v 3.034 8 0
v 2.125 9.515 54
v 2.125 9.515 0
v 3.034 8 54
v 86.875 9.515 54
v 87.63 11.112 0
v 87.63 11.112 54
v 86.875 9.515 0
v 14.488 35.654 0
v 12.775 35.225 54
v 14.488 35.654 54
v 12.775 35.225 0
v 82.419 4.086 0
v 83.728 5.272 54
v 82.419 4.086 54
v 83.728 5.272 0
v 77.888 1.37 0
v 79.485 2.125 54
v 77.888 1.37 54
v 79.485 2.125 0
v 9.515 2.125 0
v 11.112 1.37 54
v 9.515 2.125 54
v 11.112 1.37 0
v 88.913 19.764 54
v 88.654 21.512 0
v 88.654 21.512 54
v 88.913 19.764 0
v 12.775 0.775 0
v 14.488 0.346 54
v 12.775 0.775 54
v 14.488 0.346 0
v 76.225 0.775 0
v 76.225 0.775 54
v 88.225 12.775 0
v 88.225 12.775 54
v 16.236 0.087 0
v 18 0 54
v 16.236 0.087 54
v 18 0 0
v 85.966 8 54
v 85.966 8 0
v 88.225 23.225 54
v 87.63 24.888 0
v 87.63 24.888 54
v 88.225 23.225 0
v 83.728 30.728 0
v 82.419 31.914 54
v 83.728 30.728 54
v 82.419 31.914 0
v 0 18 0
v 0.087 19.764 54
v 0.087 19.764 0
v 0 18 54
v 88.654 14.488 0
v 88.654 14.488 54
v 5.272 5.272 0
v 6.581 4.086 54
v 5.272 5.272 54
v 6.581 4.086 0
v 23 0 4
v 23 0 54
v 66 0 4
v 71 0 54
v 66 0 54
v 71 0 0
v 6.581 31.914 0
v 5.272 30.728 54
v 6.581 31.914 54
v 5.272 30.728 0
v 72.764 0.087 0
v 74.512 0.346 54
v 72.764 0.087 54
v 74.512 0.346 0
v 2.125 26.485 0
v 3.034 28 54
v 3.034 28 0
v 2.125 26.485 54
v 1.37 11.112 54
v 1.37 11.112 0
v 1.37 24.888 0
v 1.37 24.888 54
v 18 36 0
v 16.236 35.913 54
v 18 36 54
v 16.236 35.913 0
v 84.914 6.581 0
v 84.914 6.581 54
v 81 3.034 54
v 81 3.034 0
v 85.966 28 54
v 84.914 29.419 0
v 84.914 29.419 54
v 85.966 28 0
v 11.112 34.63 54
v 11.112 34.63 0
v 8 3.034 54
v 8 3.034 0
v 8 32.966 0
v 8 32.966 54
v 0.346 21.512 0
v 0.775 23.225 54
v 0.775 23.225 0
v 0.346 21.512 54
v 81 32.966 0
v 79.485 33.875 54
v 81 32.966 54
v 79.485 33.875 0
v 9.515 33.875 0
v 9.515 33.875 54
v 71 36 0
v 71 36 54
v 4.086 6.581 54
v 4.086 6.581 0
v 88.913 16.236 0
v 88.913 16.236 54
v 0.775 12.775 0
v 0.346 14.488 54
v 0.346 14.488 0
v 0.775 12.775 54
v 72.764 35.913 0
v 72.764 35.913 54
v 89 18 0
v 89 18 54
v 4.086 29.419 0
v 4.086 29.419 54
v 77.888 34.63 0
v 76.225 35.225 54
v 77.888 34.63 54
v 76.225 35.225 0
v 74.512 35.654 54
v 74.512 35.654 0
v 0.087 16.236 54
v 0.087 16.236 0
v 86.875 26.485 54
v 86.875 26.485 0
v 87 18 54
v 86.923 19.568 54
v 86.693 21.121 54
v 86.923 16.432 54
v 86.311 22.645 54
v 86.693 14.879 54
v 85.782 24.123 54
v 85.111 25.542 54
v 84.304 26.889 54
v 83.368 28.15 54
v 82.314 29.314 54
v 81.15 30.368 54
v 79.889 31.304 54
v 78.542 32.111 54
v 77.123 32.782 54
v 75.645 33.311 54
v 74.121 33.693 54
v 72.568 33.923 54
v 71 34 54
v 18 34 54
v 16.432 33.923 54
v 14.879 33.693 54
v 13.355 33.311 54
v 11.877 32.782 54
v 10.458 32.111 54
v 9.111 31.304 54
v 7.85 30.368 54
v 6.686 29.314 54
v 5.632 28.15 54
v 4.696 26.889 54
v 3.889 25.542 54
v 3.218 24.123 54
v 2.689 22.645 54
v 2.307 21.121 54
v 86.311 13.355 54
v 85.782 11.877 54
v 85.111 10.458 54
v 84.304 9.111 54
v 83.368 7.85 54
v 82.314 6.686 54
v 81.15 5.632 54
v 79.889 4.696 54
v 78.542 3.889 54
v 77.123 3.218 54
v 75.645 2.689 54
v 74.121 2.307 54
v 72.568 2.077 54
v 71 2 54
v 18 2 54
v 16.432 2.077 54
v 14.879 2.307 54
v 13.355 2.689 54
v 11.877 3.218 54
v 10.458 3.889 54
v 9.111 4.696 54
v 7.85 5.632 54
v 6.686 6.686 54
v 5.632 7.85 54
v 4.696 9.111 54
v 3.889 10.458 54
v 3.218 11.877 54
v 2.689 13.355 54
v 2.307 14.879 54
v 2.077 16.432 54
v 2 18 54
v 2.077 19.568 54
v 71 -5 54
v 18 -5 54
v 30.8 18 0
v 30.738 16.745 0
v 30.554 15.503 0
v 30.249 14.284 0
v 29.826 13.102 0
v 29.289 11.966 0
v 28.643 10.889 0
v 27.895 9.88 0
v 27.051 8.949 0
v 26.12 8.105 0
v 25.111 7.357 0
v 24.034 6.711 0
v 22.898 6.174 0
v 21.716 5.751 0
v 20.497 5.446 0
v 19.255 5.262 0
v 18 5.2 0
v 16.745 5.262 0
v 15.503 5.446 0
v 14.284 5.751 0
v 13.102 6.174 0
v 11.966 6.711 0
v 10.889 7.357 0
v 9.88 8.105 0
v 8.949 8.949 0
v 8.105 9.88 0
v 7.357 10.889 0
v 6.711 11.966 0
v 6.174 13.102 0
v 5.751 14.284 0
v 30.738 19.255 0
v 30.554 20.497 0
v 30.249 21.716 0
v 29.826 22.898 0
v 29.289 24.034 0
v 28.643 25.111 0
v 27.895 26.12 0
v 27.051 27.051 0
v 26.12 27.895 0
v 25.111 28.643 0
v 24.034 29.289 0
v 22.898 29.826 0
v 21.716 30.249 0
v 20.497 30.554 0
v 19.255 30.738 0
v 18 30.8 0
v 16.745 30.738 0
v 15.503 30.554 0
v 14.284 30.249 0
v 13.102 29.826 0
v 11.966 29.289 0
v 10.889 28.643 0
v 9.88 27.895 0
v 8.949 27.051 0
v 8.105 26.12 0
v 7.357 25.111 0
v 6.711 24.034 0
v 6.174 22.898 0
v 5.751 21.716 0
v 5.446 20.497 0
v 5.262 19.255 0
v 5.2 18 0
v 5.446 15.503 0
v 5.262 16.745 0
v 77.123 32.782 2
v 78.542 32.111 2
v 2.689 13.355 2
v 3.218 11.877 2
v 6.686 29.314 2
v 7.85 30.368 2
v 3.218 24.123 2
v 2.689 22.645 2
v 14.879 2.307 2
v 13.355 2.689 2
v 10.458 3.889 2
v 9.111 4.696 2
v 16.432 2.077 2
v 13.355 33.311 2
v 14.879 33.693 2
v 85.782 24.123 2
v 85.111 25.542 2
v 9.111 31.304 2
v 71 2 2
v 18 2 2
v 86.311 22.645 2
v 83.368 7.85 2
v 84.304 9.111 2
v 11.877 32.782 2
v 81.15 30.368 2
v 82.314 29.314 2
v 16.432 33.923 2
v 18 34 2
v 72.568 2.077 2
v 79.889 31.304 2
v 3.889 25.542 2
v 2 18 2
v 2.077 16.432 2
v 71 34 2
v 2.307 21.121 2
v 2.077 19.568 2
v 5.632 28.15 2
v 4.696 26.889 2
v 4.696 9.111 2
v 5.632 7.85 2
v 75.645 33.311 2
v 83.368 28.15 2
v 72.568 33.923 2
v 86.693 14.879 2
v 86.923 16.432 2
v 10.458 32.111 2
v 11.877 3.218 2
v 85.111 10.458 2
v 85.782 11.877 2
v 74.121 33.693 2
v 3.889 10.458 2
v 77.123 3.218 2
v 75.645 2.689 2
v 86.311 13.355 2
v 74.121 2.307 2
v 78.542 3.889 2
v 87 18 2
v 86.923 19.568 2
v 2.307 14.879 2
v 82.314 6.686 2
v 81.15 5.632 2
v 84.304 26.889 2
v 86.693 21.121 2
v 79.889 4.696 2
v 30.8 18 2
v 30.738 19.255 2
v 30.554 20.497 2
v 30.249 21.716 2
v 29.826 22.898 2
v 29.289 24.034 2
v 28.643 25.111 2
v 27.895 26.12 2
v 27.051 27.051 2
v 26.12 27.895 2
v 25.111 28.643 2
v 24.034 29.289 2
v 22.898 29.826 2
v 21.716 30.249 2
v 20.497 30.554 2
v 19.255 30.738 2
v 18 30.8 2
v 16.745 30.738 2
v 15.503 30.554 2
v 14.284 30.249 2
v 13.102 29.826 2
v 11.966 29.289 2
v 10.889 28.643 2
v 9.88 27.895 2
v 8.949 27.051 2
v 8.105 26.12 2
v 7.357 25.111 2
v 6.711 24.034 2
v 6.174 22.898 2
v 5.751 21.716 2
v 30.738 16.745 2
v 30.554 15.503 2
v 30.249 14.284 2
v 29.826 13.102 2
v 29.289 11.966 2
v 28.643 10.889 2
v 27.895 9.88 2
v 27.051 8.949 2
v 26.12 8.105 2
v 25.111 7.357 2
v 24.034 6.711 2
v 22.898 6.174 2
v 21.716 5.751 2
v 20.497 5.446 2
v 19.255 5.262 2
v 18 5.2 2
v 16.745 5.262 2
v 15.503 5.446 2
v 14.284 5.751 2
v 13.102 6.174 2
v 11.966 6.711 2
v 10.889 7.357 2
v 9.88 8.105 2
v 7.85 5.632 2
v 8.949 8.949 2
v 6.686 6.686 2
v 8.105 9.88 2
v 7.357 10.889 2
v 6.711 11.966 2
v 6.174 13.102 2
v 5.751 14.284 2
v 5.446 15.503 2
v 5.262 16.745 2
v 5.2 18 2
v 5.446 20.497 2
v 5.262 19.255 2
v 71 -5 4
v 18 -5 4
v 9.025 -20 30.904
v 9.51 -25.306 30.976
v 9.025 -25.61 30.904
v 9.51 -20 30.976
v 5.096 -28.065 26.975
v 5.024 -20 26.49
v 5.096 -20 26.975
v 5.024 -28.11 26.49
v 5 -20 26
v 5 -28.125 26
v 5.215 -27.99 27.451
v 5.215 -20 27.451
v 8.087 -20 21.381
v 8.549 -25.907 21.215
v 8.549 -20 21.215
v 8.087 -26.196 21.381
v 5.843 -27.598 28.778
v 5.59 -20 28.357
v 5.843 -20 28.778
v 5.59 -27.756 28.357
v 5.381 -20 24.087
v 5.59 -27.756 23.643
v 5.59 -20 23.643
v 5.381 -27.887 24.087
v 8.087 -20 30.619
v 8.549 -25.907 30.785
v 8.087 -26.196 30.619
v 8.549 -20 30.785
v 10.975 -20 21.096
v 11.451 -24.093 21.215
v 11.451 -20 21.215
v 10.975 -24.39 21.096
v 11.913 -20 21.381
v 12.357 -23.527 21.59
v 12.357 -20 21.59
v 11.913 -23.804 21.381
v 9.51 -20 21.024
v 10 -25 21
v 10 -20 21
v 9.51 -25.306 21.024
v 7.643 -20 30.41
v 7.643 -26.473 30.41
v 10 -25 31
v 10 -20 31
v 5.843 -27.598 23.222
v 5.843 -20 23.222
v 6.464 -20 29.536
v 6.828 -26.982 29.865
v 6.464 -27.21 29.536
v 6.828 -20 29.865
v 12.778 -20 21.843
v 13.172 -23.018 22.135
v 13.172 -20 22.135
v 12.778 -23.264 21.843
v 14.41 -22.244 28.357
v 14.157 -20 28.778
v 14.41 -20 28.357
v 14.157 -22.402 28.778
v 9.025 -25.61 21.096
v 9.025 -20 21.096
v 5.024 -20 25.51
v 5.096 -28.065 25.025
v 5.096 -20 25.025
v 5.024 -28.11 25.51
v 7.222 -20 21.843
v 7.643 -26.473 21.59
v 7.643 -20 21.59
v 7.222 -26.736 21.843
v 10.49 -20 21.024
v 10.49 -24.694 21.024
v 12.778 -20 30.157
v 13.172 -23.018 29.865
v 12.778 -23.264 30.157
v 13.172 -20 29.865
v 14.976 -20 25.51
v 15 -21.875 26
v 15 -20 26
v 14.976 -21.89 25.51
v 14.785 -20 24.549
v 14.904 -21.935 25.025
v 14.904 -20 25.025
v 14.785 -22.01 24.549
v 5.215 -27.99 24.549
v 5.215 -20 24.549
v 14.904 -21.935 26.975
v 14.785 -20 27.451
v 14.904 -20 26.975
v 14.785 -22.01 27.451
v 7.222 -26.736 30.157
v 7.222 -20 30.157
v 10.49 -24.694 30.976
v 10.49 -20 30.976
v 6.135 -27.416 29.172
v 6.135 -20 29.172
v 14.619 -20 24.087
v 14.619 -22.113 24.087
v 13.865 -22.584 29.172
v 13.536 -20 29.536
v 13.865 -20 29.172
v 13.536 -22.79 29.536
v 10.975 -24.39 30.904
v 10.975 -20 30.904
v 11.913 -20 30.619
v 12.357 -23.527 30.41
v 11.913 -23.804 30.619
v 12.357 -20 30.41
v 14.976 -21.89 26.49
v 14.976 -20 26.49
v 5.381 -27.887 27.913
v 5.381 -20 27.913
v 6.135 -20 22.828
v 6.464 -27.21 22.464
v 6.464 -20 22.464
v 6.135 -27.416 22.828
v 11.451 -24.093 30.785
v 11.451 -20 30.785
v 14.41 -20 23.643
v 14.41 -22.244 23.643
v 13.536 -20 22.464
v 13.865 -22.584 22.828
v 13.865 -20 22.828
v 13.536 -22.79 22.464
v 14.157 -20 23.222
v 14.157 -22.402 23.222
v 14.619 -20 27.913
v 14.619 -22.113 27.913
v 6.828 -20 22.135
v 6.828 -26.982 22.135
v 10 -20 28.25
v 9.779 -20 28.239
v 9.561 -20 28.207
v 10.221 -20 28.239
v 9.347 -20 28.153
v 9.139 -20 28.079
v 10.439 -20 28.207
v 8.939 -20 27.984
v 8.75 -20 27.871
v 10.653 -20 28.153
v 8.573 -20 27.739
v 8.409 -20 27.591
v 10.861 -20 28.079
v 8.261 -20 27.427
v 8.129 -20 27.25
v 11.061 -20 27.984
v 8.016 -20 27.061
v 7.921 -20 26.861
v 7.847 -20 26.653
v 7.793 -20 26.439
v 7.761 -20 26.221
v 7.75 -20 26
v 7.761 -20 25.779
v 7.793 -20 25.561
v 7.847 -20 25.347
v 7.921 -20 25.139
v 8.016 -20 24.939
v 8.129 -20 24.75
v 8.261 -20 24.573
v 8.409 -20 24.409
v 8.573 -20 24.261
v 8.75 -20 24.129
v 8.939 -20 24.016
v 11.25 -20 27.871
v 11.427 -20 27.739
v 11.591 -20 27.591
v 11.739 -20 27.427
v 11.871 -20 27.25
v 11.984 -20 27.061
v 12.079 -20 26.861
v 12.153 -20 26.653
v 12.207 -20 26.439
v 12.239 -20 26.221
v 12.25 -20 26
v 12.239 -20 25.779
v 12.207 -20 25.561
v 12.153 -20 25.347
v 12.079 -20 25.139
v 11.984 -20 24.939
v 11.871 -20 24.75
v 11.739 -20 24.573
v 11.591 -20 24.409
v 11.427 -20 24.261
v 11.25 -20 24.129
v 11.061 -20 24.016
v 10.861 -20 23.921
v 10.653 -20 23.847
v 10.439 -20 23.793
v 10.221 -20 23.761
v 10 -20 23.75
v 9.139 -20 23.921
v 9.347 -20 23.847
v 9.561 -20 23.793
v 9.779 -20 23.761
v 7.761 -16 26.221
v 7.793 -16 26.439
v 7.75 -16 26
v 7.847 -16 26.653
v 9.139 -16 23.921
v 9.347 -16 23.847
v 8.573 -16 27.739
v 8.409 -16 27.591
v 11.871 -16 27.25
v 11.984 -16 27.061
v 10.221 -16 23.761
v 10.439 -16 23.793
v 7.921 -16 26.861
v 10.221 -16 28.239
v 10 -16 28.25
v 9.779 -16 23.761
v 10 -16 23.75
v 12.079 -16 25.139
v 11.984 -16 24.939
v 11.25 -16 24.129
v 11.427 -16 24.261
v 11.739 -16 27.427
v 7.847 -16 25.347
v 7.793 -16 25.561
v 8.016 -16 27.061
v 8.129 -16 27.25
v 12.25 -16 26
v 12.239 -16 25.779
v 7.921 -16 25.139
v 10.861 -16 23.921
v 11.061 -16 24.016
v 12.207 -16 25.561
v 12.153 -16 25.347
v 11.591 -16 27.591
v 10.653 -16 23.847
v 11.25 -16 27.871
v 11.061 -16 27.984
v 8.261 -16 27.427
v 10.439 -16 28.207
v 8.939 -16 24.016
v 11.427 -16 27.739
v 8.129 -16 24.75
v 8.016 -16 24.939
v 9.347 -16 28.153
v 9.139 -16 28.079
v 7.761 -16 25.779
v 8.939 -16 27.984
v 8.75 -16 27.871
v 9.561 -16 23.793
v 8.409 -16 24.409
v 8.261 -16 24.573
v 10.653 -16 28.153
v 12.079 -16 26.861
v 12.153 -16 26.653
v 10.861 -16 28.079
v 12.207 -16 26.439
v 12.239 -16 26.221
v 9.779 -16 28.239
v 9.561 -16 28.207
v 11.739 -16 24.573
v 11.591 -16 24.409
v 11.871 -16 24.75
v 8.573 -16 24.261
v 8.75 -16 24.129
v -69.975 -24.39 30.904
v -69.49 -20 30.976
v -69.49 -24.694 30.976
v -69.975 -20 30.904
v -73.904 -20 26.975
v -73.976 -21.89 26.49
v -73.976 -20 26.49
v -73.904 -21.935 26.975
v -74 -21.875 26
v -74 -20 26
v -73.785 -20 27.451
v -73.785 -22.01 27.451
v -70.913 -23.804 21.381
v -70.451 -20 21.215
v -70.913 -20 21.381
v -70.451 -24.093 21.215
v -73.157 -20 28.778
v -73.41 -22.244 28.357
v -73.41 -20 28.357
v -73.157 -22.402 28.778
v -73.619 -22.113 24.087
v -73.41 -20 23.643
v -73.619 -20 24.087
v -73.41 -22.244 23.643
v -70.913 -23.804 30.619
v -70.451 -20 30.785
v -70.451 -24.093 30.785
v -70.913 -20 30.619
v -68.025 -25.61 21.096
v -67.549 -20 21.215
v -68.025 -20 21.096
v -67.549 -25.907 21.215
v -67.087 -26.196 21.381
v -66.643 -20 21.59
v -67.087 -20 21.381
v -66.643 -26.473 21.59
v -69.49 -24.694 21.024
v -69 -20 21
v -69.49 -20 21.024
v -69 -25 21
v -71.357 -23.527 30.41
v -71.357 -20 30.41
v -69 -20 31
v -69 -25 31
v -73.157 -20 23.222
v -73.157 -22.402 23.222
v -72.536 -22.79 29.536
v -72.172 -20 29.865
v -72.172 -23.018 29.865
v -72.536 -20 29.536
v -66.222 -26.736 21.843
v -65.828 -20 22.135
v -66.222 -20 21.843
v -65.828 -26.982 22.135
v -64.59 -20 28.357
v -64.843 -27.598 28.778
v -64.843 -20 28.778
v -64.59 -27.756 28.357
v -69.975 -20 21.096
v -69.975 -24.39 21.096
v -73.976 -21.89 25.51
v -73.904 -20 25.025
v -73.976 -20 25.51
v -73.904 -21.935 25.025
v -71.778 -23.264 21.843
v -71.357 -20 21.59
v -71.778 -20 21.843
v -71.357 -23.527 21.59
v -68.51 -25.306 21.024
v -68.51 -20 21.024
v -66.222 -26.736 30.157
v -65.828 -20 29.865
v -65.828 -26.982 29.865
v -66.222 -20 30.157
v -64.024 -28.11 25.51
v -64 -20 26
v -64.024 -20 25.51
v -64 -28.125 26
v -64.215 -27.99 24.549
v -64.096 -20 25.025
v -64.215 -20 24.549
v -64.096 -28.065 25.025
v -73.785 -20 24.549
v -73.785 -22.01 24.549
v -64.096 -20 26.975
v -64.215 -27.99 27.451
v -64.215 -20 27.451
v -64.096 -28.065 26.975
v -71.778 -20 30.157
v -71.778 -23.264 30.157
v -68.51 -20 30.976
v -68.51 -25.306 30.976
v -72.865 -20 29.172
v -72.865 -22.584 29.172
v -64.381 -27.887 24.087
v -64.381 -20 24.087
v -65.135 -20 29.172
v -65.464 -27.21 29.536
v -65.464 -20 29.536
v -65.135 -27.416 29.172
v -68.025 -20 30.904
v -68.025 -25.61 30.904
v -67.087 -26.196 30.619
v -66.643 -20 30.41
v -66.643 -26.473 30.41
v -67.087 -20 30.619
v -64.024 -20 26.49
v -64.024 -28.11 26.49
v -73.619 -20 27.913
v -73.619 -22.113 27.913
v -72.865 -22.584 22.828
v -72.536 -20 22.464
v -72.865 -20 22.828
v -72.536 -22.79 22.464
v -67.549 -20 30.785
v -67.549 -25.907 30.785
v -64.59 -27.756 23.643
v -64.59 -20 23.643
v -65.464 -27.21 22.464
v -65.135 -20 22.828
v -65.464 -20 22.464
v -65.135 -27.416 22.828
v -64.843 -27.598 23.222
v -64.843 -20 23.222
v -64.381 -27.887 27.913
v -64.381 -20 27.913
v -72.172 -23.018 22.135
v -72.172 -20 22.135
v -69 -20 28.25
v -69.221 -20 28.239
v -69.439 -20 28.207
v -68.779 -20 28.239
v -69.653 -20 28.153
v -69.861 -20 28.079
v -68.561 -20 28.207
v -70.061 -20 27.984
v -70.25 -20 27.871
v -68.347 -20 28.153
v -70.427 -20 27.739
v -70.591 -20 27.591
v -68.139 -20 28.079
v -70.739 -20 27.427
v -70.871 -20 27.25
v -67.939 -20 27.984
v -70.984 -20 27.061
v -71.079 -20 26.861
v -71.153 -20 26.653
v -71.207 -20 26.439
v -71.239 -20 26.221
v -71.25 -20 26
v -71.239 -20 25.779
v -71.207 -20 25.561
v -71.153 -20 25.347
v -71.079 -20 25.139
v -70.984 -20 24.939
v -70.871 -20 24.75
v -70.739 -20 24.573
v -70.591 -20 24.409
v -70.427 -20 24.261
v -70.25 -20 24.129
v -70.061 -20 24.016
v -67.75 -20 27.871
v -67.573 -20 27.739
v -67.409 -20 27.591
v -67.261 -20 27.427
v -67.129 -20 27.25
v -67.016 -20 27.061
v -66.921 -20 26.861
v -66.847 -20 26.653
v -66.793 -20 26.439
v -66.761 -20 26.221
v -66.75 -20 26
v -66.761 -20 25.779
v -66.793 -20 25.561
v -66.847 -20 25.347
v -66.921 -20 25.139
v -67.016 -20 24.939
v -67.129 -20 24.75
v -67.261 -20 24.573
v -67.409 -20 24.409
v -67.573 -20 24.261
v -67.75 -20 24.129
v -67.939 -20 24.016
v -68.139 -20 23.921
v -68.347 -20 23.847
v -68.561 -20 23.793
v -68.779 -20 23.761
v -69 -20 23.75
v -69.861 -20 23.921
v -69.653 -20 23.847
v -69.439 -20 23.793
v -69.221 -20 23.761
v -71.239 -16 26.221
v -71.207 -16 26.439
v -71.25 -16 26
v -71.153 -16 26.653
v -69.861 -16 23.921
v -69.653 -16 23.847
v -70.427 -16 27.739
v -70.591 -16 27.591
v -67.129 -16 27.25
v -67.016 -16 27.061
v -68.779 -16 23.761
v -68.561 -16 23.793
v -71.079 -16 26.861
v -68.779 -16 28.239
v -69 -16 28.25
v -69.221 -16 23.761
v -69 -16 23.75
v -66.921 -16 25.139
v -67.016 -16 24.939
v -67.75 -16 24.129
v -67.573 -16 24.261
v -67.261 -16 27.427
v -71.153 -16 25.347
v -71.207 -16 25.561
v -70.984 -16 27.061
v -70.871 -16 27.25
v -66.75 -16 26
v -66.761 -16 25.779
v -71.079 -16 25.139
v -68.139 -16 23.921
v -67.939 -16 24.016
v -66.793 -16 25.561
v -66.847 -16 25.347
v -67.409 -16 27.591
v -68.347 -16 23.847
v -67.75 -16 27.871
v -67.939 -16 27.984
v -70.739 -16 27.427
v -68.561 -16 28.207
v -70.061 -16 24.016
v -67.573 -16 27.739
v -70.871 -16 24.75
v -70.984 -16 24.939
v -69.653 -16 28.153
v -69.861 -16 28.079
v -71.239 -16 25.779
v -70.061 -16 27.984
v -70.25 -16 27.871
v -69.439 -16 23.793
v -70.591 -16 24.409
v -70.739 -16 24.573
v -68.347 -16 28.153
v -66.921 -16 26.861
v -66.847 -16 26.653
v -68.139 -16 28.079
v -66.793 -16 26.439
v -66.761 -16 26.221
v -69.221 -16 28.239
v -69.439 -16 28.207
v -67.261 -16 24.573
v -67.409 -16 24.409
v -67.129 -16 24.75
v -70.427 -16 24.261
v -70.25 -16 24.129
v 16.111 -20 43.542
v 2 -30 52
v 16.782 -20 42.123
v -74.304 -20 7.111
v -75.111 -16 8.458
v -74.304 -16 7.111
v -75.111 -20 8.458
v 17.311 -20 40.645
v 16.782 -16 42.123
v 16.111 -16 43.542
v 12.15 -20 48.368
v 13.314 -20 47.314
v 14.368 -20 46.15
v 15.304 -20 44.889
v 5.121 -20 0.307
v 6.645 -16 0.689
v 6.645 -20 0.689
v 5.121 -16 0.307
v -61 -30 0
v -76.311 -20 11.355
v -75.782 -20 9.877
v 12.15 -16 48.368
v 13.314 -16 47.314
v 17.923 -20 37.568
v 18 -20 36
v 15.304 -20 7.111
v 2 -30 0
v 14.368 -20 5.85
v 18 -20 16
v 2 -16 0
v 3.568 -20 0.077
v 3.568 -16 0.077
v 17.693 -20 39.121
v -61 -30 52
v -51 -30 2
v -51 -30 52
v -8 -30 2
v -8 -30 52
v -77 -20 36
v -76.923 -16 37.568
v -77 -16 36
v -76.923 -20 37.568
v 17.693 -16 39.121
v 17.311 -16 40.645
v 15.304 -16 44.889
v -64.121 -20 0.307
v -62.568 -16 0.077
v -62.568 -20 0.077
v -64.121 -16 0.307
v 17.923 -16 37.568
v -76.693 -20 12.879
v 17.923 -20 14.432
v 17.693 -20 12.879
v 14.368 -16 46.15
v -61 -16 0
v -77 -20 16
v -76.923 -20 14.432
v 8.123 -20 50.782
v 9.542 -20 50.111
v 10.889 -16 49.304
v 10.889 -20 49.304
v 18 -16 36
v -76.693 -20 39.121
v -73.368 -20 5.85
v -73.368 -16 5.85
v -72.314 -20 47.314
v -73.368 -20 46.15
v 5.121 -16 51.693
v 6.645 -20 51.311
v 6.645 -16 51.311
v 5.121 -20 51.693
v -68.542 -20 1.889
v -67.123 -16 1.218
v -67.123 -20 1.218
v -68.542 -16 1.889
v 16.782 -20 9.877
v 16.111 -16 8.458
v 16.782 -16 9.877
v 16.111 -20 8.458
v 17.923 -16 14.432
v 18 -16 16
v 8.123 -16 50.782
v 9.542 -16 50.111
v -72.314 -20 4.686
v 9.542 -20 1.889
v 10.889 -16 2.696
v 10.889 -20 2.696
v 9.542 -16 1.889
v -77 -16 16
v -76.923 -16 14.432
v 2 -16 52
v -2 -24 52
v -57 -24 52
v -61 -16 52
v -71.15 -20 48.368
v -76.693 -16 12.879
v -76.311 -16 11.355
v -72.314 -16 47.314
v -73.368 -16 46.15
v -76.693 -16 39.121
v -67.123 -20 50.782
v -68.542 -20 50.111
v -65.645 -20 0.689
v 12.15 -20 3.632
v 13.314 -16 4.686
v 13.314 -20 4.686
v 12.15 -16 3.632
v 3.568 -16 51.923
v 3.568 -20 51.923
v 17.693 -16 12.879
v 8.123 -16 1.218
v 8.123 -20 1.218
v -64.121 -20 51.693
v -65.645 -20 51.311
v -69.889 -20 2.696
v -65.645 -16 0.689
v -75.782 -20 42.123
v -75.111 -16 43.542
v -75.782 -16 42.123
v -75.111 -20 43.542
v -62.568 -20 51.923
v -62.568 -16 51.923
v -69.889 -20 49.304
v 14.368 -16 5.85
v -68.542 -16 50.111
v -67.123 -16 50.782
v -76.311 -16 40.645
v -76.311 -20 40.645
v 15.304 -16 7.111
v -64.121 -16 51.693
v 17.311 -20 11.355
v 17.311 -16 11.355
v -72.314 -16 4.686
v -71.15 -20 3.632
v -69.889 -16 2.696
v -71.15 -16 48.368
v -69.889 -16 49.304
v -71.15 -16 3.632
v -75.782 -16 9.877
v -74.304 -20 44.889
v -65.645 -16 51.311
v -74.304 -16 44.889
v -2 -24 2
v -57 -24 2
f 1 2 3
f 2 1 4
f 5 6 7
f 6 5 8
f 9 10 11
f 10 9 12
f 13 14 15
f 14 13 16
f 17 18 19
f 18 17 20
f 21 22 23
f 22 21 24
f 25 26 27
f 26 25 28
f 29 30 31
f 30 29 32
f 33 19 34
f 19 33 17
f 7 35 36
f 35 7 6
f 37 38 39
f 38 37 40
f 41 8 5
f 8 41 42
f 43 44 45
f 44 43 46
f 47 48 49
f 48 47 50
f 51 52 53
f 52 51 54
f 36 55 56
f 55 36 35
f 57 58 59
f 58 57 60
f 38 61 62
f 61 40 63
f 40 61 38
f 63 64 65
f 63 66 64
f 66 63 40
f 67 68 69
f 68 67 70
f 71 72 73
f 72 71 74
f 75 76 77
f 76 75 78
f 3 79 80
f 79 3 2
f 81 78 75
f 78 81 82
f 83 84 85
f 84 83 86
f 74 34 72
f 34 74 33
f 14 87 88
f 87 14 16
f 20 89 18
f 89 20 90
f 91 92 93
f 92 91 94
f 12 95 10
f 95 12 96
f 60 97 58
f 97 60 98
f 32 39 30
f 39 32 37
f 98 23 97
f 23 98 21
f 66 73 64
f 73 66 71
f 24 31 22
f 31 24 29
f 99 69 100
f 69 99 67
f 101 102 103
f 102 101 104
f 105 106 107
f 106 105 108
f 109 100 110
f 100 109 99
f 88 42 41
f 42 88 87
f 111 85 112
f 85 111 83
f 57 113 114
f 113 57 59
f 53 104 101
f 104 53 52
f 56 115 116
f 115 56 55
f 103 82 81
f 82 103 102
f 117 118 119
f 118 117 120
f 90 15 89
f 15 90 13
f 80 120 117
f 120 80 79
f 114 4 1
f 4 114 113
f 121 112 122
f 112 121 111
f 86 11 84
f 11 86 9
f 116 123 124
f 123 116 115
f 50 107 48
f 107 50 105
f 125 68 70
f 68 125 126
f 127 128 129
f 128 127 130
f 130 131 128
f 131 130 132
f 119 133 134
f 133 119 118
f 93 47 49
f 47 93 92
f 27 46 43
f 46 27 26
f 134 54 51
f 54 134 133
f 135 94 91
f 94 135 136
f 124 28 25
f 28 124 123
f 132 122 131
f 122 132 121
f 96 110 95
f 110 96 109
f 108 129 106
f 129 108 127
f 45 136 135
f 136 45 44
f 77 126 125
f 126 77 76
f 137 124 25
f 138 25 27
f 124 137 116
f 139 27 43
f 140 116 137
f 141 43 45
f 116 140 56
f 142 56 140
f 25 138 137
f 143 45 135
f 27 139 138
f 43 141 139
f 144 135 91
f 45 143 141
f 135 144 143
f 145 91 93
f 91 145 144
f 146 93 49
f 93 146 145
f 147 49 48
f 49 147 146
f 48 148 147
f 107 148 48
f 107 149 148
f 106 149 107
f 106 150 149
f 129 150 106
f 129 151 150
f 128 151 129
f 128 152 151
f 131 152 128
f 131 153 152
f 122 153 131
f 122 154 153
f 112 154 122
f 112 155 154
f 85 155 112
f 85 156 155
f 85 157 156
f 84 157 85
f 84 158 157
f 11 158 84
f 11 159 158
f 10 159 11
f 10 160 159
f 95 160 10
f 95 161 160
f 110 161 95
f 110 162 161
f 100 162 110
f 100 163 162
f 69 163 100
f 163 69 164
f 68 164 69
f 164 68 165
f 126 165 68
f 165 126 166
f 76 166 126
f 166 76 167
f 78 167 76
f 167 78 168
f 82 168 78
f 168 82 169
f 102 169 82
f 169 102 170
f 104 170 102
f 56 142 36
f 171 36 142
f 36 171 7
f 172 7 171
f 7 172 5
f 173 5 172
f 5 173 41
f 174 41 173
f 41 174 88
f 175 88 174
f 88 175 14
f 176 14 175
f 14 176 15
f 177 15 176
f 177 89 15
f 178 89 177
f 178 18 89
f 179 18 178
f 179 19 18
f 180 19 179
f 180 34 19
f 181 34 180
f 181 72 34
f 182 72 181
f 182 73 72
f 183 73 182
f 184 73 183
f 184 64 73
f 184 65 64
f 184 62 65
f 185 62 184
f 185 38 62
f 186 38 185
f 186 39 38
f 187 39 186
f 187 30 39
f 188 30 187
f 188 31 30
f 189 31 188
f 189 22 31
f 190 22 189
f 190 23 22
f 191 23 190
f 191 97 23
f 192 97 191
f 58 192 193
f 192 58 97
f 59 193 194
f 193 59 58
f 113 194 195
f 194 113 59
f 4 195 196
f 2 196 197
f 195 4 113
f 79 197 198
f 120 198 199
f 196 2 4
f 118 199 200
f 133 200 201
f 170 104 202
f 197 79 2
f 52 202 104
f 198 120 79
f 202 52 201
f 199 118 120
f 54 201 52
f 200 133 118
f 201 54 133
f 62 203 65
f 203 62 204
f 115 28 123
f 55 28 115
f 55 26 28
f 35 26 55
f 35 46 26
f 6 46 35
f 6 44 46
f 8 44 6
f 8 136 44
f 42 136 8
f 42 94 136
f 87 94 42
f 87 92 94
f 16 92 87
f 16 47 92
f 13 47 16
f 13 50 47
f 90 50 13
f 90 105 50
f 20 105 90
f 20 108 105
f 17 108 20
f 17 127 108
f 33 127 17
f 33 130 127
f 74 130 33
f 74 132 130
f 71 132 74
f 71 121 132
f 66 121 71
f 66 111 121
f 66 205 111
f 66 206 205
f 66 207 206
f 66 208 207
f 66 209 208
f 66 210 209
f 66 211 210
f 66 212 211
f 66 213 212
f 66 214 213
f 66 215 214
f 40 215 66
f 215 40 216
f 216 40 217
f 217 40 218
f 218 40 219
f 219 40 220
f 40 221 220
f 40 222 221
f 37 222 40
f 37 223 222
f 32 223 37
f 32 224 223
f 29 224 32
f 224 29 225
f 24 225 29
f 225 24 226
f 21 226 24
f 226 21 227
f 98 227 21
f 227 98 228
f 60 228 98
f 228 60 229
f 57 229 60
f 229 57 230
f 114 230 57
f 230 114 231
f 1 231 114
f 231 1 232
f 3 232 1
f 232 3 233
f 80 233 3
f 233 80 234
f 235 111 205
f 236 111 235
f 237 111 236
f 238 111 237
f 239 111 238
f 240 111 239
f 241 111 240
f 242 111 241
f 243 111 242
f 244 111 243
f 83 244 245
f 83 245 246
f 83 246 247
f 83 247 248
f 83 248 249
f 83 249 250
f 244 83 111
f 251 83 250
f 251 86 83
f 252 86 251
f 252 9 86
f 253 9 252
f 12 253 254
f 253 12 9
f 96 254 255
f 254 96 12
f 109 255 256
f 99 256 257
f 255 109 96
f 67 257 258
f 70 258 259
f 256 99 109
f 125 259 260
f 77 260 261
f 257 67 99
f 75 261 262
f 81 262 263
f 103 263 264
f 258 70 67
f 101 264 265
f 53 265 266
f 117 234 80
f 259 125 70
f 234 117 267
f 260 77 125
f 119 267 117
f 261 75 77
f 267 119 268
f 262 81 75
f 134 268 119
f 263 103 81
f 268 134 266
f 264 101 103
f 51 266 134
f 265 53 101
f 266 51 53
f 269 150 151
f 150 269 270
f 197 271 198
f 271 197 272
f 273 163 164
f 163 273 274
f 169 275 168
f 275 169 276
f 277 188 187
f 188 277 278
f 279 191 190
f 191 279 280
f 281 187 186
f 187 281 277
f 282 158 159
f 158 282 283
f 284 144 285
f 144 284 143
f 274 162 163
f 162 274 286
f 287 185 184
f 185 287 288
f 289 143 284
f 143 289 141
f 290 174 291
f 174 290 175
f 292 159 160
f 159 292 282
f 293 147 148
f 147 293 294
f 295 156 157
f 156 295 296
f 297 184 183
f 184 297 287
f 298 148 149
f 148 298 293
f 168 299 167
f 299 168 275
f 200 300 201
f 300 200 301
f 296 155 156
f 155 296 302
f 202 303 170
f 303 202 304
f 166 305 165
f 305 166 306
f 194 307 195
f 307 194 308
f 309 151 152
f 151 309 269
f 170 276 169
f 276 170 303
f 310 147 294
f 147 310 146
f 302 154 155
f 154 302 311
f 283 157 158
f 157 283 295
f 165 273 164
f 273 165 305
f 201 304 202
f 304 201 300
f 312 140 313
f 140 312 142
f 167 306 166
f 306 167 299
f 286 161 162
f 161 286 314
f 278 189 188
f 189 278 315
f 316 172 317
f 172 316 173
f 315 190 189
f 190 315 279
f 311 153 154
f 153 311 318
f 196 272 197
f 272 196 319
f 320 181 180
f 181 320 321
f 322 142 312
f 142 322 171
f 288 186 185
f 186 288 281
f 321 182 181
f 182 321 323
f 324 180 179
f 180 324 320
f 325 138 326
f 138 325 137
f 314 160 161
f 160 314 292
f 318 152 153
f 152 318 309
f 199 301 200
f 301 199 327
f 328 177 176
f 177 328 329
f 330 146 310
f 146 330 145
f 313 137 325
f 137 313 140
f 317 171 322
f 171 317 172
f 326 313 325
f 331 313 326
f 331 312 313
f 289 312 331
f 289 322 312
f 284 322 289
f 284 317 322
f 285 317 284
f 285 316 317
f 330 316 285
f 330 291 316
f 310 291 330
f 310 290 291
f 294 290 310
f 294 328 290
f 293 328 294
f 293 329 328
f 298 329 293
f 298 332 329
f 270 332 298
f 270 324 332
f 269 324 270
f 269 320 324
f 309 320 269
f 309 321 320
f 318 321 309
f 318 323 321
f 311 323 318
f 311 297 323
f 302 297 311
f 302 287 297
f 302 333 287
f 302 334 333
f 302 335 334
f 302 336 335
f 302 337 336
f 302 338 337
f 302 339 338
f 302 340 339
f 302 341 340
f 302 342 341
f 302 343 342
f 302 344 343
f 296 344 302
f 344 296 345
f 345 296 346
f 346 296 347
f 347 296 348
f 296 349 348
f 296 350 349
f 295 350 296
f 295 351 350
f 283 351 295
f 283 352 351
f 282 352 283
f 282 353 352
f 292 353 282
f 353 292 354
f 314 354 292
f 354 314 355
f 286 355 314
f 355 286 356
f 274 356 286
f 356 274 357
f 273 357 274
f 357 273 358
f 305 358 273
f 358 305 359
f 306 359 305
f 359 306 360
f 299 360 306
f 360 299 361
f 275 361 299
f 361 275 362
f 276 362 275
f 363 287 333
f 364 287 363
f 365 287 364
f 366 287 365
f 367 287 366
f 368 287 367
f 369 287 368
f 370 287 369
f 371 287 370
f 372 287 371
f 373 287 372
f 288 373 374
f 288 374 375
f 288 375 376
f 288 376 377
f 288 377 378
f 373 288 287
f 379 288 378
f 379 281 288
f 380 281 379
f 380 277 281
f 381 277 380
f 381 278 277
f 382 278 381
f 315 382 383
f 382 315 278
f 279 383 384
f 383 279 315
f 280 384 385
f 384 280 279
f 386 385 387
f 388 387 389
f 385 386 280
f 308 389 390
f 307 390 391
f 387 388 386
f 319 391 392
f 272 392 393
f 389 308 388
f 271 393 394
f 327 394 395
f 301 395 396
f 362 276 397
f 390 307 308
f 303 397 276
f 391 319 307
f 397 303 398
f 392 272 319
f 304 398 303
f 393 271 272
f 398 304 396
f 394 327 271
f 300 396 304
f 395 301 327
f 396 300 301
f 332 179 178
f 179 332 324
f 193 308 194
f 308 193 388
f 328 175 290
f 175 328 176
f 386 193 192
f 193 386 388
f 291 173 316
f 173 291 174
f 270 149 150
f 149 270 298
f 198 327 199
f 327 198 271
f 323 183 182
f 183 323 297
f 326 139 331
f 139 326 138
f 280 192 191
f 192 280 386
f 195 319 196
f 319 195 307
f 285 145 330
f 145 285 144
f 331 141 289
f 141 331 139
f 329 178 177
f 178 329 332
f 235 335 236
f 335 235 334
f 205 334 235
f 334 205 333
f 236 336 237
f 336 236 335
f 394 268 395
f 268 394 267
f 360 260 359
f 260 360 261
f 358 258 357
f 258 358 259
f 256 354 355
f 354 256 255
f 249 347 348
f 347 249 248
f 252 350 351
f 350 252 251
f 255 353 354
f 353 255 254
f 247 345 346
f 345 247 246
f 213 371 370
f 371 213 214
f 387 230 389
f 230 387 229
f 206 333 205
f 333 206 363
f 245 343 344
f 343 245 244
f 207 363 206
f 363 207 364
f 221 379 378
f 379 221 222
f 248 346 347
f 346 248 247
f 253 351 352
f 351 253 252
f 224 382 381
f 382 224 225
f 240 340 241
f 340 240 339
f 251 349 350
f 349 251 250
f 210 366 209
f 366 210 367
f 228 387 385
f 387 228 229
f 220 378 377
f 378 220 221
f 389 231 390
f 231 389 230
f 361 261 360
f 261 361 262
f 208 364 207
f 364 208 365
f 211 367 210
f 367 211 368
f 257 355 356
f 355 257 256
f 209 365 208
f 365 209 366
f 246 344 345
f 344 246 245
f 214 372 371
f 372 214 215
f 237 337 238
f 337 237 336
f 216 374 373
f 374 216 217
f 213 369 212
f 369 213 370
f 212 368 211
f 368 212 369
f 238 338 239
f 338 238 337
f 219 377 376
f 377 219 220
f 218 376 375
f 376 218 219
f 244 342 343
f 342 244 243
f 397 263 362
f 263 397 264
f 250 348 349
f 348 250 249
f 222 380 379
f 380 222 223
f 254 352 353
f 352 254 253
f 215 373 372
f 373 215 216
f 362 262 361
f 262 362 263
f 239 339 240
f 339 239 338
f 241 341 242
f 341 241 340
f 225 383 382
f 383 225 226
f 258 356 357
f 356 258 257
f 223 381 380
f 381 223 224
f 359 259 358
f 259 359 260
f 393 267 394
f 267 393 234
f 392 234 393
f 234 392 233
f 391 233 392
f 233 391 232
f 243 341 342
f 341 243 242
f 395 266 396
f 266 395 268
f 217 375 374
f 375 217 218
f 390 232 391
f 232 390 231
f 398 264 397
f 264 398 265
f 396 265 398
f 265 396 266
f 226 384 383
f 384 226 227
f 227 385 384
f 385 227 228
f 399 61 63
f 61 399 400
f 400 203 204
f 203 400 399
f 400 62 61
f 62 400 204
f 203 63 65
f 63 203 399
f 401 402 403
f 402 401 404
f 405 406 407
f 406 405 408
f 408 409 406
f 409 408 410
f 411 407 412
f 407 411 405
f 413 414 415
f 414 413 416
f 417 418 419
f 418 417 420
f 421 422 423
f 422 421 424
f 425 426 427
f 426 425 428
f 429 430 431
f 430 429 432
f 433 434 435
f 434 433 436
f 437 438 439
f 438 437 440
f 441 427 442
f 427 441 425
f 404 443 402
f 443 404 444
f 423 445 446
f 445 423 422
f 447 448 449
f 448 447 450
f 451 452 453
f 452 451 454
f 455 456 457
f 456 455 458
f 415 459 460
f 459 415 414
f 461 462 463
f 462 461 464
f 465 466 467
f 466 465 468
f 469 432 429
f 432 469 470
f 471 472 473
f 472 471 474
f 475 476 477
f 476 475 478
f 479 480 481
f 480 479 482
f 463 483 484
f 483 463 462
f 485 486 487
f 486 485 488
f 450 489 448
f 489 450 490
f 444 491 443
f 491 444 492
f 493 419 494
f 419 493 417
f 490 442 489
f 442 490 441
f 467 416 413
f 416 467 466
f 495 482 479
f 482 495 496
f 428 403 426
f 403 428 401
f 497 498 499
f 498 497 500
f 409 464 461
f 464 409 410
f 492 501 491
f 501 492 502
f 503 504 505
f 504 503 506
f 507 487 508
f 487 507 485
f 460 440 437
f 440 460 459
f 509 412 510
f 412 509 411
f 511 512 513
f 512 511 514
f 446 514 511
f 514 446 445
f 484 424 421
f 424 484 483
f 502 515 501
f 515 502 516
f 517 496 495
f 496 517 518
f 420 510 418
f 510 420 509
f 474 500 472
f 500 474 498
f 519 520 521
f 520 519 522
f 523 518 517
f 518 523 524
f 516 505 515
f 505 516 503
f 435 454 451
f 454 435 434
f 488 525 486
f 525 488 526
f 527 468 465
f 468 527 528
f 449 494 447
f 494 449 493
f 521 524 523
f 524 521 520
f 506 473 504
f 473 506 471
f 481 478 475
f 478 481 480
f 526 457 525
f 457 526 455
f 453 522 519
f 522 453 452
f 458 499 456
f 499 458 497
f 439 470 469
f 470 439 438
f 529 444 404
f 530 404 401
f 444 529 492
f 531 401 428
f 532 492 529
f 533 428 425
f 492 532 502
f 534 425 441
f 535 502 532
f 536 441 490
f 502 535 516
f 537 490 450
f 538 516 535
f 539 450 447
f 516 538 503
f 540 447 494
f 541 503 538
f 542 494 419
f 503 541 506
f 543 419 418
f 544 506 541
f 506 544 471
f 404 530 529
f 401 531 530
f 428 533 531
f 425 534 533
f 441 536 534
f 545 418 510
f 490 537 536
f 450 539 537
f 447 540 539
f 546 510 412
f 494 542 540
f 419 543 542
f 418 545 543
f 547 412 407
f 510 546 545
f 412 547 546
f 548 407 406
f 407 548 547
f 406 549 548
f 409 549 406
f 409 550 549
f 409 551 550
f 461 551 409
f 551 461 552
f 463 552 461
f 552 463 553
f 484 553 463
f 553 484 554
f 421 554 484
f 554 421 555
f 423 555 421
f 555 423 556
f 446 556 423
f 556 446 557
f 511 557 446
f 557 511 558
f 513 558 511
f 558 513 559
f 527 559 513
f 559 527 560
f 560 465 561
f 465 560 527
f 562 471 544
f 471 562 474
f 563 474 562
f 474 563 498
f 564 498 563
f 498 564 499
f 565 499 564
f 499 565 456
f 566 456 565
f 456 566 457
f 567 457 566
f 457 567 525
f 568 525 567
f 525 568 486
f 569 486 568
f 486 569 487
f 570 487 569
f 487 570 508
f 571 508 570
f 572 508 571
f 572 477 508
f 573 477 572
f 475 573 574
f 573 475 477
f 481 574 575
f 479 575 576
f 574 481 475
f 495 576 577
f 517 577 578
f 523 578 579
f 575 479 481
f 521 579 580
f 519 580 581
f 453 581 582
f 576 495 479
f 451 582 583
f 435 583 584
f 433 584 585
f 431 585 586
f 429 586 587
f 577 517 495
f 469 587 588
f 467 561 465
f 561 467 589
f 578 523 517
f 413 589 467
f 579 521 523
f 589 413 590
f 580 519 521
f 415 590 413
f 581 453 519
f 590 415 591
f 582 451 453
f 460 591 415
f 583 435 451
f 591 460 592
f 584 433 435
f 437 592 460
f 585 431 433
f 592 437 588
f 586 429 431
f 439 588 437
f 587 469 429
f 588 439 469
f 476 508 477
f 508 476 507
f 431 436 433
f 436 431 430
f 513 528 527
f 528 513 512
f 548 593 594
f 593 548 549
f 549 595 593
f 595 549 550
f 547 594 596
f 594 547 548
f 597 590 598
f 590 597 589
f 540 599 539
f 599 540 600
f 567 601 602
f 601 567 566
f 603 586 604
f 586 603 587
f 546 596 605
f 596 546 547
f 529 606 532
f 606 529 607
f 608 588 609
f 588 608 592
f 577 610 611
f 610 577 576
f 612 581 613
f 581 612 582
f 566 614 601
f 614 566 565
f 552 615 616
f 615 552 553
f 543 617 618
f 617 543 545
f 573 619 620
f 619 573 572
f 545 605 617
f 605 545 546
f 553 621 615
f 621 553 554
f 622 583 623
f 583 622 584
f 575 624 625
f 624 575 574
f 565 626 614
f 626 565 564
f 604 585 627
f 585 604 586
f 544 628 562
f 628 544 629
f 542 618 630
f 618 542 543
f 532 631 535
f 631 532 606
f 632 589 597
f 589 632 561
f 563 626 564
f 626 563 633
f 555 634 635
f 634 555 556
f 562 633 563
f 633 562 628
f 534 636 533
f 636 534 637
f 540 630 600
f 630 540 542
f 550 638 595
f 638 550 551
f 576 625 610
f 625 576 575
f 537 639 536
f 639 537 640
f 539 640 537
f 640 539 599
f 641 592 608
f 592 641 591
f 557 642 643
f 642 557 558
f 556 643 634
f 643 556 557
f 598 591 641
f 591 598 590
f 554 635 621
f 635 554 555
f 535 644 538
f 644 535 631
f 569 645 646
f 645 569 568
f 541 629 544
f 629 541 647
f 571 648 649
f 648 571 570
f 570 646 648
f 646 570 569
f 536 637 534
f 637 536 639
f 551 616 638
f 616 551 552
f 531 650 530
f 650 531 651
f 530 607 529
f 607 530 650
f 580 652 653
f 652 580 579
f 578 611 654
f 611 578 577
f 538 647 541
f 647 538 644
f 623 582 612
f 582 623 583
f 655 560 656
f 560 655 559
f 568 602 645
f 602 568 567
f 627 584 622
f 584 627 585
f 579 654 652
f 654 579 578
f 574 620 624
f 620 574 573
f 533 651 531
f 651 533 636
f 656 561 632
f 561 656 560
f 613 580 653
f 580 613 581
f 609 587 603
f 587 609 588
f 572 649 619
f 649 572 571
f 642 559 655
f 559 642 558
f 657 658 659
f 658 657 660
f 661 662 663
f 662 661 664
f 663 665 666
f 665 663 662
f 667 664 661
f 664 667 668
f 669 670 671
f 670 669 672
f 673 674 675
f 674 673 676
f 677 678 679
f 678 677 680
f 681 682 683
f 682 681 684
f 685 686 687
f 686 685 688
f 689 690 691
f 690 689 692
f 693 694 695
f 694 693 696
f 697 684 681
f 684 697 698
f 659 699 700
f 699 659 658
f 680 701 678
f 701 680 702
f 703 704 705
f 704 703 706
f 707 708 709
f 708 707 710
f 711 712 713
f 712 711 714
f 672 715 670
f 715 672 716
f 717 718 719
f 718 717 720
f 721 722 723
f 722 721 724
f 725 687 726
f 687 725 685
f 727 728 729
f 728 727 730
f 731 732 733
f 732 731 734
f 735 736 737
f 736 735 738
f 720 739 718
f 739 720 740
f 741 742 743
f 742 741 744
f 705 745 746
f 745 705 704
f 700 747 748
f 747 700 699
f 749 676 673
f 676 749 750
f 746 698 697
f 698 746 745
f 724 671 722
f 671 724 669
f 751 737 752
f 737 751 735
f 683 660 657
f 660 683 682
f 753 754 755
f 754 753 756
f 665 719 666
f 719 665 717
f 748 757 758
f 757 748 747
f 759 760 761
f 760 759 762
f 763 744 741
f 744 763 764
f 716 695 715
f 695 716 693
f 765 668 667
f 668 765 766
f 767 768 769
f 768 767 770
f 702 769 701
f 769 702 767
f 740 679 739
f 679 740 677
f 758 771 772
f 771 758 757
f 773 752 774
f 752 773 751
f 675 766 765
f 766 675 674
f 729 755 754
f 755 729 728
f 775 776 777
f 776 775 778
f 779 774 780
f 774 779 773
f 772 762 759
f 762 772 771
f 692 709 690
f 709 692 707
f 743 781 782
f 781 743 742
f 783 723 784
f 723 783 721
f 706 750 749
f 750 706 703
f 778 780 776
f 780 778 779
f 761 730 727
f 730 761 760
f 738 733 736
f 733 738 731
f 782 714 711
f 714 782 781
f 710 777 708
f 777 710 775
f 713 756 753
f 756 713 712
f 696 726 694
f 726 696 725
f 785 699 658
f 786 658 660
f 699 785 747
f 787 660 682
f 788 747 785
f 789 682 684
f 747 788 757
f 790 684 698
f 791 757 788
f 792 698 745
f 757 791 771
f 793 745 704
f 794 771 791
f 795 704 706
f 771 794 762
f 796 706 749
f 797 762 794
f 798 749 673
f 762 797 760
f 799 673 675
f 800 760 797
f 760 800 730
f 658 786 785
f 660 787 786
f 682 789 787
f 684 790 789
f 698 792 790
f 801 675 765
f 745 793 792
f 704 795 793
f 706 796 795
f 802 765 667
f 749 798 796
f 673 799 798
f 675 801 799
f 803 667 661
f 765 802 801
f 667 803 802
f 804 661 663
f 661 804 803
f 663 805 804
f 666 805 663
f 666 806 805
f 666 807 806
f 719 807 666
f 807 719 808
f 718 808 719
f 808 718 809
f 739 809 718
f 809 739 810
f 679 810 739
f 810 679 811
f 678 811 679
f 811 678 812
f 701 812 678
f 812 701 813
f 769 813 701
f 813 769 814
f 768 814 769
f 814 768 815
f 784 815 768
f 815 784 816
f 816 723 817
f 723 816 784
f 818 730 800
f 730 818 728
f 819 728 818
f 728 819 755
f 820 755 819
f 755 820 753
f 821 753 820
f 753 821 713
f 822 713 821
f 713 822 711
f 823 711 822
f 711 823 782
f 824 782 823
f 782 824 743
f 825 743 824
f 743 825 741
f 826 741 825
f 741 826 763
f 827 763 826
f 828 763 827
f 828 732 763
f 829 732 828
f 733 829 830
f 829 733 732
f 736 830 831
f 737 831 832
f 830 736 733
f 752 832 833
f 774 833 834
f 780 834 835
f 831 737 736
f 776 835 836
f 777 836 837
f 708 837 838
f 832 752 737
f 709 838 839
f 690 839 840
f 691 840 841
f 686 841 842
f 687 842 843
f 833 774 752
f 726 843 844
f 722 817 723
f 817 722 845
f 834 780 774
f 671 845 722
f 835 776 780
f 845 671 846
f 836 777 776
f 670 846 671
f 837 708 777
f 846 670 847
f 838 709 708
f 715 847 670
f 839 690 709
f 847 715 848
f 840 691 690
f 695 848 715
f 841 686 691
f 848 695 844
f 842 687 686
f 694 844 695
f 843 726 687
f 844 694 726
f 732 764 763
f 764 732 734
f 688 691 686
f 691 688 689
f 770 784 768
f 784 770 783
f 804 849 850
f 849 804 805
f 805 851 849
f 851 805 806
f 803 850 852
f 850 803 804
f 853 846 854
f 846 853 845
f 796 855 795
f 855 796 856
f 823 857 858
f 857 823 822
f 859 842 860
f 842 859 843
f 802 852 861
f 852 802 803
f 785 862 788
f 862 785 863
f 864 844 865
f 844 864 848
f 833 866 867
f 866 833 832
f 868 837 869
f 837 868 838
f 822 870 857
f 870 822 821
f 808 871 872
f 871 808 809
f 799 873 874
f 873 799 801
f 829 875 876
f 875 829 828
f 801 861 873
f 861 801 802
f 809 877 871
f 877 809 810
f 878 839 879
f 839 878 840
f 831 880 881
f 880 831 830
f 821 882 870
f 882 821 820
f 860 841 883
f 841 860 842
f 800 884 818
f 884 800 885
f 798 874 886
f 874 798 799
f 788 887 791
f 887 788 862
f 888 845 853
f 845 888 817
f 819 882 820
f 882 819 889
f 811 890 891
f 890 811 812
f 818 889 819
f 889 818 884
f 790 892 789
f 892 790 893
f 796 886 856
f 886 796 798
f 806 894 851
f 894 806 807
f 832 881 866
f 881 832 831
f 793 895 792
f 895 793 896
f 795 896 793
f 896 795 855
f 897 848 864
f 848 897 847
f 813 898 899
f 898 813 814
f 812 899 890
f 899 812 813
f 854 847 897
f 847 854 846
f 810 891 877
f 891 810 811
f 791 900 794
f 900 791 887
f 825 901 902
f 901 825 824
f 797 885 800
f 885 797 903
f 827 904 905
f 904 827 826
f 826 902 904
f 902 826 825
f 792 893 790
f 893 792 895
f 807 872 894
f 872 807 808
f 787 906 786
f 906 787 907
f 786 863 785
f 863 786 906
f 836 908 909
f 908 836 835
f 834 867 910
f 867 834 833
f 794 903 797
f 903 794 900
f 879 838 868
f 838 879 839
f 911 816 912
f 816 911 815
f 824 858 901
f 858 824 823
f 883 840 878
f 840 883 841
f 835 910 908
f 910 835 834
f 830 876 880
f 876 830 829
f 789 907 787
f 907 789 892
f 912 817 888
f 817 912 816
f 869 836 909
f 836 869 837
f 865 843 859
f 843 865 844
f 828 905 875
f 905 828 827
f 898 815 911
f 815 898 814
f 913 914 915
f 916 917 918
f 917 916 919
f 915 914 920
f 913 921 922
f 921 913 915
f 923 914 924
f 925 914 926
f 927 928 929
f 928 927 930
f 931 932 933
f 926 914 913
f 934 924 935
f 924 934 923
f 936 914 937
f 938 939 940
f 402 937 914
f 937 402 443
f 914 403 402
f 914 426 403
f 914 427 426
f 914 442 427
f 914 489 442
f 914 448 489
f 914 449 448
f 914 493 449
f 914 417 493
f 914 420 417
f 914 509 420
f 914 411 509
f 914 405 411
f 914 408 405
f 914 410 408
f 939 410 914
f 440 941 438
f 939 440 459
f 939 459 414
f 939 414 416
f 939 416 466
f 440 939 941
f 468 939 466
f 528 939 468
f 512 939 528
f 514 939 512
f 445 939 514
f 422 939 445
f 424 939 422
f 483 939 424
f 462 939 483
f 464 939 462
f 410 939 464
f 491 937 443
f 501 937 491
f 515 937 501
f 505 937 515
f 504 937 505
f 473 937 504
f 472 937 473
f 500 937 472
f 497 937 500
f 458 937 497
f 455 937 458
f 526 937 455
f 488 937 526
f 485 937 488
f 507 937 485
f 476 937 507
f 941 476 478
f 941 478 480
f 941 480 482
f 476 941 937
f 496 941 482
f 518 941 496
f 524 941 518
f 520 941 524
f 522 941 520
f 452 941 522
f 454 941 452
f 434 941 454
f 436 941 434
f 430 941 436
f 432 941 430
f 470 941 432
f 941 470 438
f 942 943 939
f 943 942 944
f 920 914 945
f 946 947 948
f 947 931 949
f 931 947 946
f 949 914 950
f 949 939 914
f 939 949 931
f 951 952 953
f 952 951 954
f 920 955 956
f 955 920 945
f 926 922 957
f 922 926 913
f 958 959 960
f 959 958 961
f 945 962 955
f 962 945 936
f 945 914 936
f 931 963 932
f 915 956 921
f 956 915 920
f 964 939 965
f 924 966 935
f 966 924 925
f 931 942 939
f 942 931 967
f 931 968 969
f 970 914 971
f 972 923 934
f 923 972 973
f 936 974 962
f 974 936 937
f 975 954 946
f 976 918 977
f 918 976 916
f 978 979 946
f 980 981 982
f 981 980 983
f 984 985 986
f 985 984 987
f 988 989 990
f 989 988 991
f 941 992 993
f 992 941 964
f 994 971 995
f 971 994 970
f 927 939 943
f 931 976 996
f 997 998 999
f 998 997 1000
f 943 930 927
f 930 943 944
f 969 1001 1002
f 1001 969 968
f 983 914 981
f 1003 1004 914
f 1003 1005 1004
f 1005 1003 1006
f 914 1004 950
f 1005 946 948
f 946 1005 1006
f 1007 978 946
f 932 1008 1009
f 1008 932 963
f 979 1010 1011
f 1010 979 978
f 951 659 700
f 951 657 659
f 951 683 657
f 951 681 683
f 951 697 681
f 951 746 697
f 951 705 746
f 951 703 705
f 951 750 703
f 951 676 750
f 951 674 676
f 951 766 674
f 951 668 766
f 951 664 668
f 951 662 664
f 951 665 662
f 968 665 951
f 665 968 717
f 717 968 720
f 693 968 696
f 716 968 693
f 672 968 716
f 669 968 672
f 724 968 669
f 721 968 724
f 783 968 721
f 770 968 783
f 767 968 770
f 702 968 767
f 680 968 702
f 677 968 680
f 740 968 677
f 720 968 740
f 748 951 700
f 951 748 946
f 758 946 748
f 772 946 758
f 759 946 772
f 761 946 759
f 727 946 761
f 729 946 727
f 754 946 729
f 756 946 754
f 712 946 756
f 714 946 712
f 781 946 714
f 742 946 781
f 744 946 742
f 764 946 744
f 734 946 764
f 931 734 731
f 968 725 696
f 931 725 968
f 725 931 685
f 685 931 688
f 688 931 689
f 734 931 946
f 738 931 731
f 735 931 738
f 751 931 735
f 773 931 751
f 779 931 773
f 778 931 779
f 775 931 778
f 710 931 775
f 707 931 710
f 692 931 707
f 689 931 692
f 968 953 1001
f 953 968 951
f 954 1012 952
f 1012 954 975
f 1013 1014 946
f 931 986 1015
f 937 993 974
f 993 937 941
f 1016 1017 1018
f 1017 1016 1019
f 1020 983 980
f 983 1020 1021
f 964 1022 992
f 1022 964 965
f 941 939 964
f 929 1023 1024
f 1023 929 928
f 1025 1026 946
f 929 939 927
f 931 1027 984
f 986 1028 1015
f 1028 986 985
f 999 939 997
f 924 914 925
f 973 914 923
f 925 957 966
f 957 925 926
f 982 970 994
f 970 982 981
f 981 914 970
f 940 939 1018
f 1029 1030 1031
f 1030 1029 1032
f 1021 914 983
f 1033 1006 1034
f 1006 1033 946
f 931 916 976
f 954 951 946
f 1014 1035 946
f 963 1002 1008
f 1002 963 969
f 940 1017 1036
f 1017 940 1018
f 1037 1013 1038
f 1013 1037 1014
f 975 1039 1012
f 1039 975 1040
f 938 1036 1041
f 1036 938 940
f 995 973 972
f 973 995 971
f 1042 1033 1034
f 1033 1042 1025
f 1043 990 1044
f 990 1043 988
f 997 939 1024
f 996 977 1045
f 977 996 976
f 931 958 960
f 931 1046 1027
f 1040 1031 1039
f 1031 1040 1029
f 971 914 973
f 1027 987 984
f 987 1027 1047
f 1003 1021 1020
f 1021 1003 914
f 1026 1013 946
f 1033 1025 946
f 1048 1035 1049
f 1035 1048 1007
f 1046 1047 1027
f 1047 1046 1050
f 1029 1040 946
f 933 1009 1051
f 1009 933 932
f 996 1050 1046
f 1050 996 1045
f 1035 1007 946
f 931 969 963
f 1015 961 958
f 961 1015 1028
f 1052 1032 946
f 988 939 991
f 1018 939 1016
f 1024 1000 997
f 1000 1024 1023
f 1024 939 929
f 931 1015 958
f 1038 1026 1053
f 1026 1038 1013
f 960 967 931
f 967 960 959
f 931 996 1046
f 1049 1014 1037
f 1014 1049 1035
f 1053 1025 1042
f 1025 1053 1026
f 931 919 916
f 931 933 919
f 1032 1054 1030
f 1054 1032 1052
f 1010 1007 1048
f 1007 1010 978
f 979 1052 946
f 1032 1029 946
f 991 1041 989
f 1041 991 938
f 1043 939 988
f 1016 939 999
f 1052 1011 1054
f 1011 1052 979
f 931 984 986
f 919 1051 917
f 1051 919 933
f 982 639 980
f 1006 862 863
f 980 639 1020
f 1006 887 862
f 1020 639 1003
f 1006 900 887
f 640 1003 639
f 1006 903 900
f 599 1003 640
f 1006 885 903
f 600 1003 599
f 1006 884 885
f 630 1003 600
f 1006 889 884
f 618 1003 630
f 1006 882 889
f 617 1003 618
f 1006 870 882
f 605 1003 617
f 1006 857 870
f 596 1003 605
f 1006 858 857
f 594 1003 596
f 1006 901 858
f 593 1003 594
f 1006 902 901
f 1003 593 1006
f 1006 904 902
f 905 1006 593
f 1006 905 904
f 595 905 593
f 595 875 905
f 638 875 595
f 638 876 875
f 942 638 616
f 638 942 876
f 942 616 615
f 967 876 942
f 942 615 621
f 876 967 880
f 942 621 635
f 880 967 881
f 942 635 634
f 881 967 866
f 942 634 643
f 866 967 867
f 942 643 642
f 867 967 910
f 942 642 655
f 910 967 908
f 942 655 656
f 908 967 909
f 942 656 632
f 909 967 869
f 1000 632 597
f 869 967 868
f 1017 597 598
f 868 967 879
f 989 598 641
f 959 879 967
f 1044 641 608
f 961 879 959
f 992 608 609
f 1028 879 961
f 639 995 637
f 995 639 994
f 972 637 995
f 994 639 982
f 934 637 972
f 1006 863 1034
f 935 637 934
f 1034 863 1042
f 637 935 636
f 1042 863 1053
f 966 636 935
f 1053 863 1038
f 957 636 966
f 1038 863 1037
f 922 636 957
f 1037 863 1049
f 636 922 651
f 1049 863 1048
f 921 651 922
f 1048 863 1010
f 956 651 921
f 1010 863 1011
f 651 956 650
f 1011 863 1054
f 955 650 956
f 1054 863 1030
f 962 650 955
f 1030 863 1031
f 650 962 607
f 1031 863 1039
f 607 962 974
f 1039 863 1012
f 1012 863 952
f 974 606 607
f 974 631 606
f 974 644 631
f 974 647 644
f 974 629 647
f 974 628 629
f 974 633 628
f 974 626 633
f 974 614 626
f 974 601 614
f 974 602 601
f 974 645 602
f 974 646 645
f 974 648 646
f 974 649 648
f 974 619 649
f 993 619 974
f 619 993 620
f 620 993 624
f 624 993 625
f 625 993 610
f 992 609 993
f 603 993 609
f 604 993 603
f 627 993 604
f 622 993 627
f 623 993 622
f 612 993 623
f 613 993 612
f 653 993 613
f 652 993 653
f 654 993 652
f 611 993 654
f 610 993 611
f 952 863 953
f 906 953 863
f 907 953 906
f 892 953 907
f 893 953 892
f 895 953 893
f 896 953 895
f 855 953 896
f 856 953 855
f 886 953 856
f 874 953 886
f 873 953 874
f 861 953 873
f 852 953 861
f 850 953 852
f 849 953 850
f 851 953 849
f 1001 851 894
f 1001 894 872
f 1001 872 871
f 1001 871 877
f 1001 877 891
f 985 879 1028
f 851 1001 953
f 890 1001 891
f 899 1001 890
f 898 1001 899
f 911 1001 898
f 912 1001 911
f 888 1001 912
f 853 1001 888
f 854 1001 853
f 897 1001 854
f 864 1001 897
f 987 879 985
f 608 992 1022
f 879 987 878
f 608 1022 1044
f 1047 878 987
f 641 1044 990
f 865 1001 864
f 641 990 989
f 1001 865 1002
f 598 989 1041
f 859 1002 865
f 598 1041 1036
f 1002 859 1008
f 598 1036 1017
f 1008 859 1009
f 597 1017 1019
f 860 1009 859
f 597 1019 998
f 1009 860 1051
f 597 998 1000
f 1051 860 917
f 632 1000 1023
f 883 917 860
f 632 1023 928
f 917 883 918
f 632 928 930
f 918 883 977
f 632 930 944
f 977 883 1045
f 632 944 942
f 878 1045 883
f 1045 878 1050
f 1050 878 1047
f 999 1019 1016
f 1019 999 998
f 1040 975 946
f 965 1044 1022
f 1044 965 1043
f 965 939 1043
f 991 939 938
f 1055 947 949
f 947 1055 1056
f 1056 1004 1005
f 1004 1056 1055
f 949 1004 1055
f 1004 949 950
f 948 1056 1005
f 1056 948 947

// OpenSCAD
// vacuum transformer holder


SOCKET_THICKNESS = 2;
SOCKET_FUDGE = 1;
SOCKET_X = 84 + SOCKET_FUDGE;
SOCKET_Y = 31 + SOCKET_FUDGE;
SOCKET_Z = 50;

TRAPEZOID_X = SOCKET_X - SOCKET_Y;
TRAPEZOID_Y = 5;
TRAPEZOID_FUDGE = 1;

module _rounded_trapezoid(x, y, z, thickness) {
    hull() {
        diam = y + (2 * thickness);
        cylinder(d=diam, h=z + (2 * thickness), $fn=64);
        translate([x + (2 * thickness) - diam, 0, 0]) cylinder(d=diam, h=z + (2 * thickness), $fn=64);
    }

}

module _mounting_trapezoid(x, y, z) {
    mirror([0, 1, 0]) linear_extrude(z) polygon([[0 + y, 0], [x - y, 0], [x, y], [0, y], [0+y, 0]]);
}

module xformer_socket() {
    translate([(0.5 * SOCKET_Y) + SOCKET_THICKNESS, (0.5 * SOCKET_Y) + SOCKET_THICKNESS, 0]) difference() {
        _rounded_trapezoid(SOCKET_X, SOCKET_Y, SOCKET_Z, SOCKET_THICKNESS);
        translate([0, 0, SOCKET_THICKNESS]) _rounded_trapezoid(SOCKET_X, SOCKET_Y, SOCKET_Z + SOCKET_THICKNESS, 0);
        cylinder(d=0.8 * SOCKET_Y, h=SOCKET_THICKNESS, $fn=64);
    }

    translate([0.5 * (SOCKET_X + (2 * SOCKET_THICKNESS) - TRAPEZOID_X), 0, 2 * SOCKET_THICKNESS]) _mounting_trapezoid(TRAPEZOID_X, TRAPEZOID_Y, SOCKET_Z);
    //translate([-0.5 * (SOCKET_Y + (2*SOCKET_THICKNESS)), 0, 0]) cube([SOCKET_X + (2 * SOCKET_THICKNESS), SOCKET_Y + (2 * SOCKET_THICKNESS), SOCKET_Z + (2 * SOCKET_THICKNESS)]);
}

module socket_mount() {
    CUBE_X = (4 * SOCKET_THICKNESS) + TRAPEZOID_X + (2 * TRAPEZOID_FUDGE);
    CUBE_Y = 2 * TRAPEZOID_Y;
    CUBE_Z = SOCKET_Z + SOCKET_THICKNESS;
    WING_DIAM = SOCKET_Y;
    WING_THICKNESS = CUBE_Y - (TRAPEZOID_Y + TRAPEZOID_FUDGE);
    
    SCREW_INSET_DIAM=10;
    SCREW_DIAM = 4.5;
    
    rotate([0, 0, 180]) translate([-1 * SOCKET_THICKNESS, 0, 0]) {
            difference() {
            union() {
                hull() {
                    cube([CUBE_X, CUBE_Y, CUBE_Z]);
                    hull() {
                        for(i=[0:1:3]) {
                            translate([floor(i / 2) * CUBE_X, 0, (i % 2) * CUBE_Z + ((i%2) * -1 * WING_DIAM) + (0.5 * WING_DIAM)]) rotate([90, 0, 0]) cylinder(d=WING_DIAM, h=WING_THICKNESS, $fn=64);
                        }
                    }
                }
            }
            translate([0.5 * (CUBE_X - (TRAPEZOID_X + (2 * TRAPEZOID_FUDGE))), CUBE_Y, SOCKET_THICKNESS]) _mounting_trapezoid(TRAPEZOID_X + (2 * TRAPEZOID_FUDGE), TRAPEZOID_Y + TRAPEZOID_FUDGE, SOCKET_Z);
            
            // screw one
            translate([-0.25 * WING_DIAM, CUBE_Y, 0.5 * CUBE_Z]) rotate([90, 0, 0]) union() {
                cylinder(h=CUBE_Y, d=SCREW_INSET_DIAM, $fn=64);
                cylinder(h=2 * CUBE_Y, d=SCREW_DIAM, $fn=64);
            }
            
            // screw two
            translate([(0.25 * WING_DIAM) + CUBE_X, CUBE_Y, 0.5 * CUBE_Z]) rotate([90, 0, 0]) union() {
                cylinder(h=CUBE_Y, d=SCREW_INSET_DIAM, $fn=64);
                cylinder(h=2 * CUBE_Y, d=SCREW_DIAM, $fn=64);
            }
        }
    }
}

module socket_step() {
}

module cord_winder() {
}

xformer_socket();
translate([0, -20, 0]) socket_mount();
